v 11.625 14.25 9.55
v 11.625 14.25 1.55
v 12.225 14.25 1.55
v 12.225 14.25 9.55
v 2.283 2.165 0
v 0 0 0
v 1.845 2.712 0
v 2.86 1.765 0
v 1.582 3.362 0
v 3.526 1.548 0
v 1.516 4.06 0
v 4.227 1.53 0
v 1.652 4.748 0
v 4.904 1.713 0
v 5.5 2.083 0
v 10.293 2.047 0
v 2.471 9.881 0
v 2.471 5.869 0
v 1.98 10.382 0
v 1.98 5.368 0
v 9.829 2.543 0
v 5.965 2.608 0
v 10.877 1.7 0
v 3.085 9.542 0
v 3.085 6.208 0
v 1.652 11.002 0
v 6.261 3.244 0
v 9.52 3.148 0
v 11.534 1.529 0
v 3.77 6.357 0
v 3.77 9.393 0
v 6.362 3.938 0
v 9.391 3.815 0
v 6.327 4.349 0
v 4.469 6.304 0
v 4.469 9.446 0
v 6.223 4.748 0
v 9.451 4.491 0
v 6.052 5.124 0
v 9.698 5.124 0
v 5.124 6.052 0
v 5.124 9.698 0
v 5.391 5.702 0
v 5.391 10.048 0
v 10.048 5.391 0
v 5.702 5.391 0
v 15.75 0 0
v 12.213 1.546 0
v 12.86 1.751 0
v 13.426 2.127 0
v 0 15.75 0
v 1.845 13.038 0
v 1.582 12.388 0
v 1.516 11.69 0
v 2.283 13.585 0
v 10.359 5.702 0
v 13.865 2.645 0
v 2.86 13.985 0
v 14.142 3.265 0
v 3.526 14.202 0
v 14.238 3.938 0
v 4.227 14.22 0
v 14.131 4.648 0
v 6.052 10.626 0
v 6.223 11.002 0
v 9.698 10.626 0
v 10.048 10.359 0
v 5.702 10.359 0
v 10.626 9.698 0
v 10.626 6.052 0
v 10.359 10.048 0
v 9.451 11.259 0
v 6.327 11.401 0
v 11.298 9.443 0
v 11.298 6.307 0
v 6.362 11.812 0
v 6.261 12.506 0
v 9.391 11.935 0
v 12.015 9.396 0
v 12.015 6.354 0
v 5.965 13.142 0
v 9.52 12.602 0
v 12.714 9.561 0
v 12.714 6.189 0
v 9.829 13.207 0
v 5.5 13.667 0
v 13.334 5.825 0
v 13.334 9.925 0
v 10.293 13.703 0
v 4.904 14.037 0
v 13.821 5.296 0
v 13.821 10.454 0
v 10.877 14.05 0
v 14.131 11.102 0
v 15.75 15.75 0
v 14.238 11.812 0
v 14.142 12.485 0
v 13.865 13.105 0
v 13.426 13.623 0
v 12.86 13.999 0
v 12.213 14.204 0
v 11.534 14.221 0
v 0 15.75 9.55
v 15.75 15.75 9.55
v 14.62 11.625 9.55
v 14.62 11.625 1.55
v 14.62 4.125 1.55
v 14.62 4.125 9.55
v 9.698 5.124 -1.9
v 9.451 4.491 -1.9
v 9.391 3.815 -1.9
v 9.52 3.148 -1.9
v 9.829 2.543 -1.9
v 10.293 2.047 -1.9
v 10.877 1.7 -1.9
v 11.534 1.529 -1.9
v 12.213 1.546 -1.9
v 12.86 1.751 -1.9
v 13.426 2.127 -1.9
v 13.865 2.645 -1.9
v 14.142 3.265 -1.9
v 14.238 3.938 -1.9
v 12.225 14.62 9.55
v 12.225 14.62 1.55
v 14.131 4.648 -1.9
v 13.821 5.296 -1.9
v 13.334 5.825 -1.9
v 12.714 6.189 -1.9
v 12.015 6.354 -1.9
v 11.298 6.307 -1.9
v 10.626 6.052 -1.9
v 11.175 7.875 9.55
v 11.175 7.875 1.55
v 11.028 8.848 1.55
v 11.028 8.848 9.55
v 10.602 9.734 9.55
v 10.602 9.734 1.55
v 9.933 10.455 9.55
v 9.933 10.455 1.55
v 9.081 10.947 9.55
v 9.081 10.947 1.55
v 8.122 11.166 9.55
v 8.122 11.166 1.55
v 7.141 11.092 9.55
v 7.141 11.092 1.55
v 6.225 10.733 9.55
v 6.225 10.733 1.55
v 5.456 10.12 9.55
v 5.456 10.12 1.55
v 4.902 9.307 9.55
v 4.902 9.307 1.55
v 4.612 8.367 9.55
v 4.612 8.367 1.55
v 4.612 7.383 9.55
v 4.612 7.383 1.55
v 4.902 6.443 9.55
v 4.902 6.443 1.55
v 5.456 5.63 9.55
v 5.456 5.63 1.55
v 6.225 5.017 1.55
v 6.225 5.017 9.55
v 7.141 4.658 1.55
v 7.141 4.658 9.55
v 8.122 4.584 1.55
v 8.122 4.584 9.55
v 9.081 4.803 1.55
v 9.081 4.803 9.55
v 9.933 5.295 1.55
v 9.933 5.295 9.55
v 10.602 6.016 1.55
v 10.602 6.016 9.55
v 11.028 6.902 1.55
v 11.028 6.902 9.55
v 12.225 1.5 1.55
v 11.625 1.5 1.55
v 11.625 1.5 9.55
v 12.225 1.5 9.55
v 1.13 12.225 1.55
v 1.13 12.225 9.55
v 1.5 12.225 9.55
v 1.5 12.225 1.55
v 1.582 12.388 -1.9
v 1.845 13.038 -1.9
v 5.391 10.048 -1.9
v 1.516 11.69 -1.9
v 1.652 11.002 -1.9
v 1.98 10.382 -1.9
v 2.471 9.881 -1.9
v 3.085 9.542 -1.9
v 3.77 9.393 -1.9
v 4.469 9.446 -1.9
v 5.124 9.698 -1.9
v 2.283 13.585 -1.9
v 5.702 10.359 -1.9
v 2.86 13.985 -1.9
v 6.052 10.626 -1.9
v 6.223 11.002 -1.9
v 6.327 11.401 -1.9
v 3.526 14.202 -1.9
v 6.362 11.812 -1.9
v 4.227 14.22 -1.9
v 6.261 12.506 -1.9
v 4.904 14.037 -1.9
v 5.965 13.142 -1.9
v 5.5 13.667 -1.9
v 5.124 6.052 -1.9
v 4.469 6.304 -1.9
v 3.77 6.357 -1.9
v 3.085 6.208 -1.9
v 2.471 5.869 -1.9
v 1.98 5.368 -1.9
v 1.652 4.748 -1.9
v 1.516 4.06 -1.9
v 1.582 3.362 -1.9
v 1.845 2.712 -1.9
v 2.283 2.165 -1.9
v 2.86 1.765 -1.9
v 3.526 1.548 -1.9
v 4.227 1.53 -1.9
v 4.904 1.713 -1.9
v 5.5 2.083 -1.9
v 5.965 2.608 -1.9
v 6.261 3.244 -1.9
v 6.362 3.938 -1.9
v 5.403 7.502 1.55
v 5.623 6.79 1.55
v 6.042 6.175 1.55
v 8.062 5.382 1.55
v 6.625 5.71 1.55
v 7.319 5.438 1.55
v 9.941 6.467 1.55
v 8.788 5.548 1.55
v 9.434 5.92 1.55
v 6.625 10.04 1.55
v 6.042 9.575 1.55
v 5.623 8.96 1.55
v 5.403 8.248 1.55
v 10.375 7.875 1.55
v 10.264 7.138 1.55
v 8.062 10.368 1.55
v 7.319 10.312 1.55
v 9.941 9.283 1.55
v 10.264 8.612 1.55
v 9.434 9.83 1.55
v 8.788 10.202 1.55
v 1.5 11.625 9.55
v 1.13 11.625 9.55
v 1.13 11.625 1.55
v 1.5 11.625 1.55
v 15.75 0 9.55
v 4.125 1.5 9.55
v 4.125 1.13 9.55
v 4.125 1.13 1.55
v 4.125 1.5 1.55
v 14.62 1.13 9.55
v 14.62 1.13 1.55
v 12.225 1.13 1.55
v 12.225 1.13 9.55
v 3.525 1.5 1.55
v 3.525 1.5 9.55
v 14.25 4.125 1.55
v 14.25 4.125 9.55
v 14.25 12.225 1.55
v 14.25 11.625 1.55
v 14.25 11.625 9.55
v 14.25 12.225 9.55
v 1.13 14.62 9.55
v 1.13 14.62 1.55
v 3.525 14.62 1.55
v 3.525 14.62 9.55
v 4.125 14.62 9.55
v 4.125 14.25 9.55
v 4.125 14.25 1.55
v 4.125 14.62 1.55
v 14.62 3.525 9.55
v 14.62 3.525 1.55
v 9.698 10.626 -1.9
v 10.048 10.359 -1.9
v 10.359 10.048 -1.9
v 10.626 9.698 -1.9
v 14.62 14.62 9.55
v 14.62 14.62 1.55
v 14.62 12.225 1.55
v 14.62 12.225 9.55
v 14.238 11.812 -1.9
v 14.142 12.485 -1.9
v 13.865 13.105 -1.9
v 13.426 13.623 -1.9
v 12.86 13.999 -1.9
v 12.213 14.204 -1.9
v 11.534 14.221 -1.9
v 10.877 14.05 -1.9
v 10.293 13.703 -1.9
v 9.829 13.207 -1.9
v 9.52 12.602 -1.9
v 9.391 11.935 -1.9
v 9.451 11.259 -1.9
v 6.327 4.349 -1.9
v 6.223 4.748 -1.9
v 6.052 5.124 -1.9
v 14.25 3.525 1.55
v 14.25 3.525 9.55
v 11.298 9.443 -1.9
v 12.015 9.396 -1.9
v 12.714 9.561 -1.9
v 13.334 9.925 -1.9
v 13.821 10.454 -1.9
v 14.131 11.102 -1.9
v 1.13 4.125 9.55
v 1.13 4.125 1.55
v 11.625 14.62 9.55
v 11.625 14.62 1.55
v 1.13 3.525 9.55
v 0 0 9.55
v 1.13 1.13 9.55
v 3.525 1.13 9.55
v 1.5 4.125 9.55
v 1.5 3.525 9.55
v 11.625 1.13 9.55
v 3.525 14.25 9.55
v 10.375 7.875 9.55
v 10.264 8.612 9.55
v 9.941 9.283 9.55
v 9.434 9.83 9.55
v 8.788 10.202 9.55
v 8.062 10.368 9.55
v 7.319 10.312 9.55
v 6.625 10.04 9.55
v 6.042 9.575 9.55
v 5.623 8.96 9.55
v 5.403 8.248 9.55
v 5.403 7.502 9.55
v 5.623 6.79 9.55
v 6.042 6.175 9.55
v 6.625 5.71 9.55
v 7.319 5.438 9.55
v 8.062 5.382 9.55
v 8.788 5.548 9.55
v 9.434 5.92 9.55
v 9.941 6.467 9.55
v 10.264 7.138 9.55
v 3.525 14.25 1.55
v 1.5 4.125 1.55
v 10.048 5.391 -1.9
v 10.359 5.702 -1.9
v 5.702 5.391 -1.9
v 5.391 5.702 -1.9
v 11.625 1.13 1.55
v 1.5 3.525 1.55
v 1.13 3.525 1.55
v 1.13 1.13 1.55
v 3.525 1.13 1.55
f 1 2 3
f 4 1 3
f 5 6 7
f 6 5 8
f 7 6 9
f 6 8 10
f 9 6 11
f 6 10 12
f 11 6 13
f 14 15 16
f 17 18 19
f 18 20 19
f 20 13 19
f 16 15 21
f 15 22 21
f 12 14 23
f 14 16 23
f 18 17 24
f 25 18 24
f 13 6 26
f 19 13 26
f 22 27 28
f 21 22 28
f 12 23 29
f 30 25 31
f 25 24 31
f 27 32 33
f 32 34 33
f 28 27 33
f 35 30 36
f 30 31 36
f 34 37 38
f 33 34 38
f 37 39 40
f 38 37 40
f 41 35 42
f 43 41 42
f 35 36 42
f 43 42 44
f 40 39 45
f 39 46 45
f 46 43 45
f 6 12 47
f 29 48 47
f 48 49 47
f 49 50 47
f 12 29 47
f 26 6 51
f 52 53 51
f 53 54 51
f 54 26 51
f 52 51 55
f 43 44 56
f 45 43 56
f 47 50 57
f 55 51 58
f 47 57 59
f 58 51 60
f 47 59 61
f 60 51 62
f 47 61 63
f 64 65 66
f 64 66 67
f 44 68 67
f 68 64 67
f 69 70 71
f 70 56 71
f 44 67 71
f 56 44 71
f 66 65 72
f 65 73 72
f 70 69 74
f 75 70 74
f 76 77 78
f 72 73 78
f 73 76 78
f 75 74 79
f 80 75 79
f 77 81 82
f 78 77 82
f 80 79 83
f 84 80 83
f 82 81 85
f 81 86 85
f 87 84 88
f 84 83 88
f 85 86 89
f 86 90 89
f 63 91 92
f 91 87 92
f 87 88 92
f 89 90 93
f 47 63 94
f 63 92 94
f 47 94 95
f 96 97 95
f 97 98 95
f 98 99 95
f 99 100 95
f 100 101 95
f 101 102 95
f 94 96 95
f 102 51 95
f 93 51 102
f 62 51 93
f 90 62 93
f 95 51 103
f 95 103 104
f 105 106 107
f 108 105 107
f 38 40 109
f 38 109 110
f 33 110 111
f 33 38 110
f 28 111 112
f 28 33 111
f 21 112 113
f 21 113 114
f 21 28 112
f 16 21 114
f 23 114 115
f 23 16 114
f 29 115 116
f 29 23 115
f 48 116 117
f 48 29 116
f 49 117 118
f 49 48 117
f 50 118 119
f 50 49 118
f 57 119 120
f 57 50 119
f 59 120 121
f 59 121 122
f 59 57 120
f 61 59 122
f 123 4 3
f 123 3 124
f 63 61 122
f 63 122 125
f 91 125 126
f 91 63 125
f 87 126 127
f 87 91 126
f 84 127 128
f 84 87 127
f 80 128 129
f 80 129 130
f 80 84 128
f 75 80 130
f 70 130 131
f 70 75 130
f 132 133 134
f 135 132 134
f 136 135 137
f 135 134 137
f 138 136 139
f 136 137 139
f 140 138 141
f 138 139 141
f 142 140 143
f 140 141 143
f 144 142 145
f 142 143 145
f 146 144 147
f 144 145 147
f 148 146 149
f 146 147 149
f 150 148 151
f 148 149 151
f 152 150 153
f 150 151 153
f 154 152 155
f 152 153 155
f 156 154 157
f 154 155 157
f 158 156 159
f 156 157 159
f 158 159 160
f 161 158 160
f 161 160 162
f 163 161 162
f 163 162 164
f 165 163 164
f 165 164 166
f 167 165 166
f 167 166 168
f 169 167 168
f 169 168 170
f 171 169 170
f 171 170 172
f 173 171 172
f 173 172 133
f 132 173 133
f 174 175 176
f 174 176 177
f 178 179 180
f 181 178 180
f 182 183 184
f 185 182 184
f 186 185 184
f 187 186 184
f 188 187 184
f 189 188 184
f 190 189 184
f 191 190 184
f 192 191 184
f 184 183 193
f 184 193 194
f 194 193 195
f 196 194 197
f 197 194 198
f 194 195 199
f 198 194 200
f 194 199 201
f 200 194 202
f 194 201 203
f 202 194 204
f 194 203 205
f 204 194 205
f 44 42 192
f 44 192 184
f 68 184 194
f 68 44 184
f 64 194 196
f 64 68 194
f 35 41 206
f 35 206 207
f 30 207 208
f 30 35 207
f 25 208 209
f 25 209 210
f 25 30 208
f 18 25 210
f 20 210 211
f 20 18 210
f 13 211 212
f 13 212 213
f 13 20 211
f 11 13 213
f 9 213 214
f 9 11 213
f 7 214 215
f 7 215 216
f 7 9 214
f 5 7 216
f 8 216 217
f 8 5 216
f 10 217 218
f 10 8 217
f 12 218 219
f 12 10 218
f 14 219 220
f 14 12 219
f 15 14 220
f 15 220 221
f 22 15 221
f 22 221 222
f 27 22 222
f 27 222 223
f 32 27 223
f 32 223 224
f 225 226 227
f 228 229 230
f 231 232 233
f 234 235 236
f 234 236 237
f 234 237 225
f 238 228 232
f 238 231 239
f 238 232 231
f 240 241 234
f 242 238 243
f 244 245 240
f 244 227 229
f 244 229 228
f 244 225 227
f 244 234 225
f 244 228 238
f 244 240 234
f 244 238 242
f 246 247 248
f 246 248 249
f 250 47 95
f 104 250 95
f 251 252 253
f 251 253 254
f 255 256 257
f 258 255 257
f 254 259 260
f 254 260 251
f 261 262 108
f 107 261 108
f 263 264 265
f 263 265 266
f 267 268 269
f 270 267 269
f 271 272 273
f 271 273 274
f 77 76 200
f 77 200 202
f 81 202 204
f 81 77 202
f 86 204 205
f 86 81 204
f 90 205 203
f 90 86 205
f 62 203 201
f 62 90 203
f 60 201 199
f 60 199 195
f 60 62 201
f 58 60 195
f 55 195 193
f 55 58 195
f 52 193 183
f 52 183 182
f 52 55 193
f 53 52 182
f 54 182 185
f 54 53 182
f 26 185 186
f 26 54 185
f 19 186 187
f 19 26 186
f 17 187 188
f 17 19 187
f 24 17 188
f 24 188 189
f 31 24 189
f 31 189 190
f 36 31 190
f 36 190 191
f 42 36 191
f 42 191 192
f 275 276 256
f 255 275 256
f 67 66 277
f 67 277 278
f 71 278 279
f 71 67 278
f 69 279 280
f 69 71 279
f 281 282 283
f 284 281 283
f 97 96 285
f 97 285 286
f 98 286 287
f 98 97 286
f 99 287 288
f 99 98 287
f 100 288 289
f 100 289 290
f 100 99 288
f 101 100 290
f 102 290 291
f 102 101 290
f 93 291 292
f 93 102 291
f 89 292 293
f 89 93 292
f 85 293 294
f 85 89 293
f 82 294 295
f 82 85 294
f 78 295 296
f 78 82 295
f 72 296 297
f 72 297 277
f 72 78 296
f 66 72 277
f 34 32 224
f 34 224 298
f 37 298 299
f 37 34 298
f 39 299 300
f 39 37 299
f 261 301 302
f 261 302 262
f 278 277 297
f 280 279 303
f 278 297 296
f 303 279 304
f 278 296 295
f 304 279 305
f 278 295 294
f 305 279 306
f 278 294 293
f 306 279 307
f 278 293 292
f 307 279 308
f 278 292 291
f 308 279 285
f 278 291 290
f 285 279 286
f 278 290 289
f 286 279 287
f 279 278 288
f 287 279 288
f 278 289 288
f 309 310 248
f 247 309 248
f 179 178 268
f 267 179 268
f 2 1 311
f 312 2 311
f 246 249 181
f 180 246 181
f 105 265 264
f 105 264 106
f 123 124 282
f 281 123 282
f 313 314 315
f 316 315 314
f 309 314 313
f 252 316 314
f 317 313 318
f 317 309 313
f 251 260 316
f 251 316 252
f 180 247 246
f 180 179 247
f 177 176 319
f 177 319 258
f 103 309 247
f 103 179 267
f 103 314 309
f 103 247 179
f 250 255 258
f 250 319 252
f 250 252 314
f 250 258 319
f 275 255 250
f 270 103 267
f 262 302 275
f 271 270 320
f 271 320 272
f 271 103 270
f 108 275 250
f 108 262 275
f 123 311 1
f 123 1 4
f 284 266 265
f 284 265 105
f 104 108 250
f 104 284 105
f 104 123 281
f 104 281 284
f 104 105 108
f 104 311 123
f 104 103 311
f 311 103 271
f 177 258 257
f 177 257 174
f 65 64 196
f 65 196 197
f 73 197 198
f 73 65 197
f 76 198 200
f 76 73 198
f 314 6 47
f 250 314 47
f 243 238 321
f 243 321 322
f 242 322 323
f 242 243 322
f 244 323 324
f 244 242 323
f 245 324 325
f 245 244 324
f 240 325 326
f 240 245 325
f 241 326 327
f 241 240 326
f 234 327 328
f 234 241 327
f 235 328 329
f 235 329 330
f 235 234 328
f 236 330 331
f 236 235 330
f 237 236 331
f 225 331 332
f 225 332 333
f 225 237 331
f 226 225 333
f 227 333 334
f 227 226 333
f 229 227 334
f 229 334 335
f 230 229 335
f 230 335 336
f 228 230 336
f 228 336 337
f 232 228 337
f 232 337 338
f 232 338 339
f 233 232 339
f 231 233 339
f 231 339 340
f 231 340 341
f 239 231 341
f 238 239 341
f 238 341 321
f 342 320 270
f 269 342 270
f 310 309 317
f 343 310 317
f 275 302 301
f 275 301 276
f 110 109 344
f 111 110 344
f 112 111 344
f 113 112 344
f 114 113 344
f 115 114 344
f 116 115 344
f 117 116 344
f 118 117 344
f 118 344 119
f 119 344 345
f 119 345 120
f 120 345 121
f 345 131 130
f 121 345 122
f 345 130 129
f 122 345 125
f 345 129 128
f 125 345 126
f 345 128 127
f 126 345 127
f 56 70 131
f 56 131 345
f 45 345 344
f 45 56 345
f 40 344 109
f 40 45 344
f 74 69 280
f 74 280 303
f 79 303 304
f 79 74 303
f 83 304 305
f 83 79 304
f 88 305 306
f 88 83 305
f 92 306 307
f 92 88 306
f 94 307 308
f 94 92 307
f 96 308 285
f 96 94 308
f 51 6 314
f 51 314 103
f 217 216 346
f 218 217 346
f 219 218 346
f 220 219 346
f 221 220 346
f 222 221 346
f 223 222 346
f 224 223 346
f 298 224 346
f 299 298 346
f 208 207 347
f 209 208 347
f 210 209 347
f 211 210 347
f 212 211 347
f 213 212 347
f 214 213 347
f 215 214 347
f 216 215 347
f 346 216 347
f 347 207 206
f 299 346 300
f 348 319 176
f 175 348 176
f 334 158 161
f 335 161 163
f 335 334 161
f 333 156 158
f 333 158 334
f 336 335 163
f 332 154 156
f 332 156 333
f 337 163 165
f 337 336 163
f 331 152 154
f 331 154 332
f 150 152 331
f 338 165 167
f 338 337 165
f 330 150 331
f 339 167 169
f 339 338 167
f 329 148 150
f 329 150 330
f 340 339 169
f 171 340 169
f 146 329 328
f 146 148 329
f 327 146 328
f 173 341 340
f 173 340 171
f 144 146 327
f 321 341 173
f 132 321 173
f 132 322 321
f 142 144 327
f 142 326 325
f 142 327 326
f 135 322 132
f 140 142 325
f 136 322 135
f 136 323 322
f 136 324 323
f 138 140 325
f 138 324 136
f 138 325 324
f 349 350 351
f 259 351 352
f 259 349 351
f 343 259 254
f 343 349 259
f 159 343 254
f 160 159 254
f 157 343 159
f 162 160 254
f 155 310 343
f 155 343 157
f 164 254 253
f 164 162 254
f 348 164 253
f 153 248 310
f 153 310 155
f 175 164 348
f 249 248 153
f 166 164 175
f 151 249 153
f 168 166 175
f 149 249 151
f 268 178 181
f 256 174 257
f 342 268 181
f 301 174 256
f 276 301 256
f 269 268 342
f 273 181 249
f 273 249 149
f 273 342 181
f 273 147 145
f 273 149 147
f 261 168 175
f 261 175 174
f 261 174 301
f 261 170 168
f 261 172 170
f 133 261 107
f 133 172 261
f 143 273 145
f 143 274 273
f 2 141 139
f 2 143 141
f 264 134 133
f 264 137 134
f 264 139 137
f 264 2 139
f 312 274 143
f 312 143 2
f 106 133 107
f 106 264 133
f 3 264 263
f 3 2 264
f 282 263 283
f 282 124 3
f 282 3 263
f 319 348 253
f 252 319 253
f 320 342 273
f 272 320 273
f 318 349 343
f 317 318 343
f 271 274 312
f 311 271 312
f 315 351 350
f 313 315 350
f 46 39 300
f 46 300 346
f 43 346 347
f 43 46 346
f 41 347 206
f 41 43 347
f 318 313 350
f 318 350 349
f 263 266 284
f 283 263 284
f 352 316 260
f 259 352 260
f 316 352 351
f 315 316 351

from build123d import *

# Parameters (mm, degrees)
F0_W     = 15.75
F0_H     = 15.75
F0_W_2   = 0.6
F0_H_2   = 0.37
F0_W_3   = 0.37
F0_H_3   = 0.6
F1_DEPTH = 9.55
F0_R     = 3.3
F0_R_2   = 2.5
F2_DEPTH = 1.55
F4_DEPTH = 1.9


with BuildPart() as f1:
    # F0 (on Top) → F1 (new body)
    with BuildSketch(Plane.XY):
        with Locations((7.875, 7.875)):
            Rectangle(F0_W, F0_H)
        Polygon((1.13, 12.225), (1.13, 14.62), (3.525, 14.62), (4.125, 14.62), (11.625, 14.62), (12.225, 14.62), (14.62, 14.62), (14.62, 12.225), (14.62, 11.625), (14.62, 4.125), (14.62, 3.525), (14.62, 1.13), (12.225, 1.13), (11.625, 1.13), (4.125, 1.13), (3.525, 1.13), (1.13, 1.13), (1.13, 3.525), (1.13, 4.125), (1.13, 11.625), align=None, mode=Mode.SUBTRACT)
        with Locations((3.825, 14.435)):
            Rectangle(F0_W_2, F0_H_2)
        with Locations((1.315, 11.925)):
            Rectangle(F0_W_3, F0_H_3)
        with Locations((1.315, 3.825)):
            Rectangle(F0_W_3, F0_H_3)
        with Locations((3.825, 1.315)):
            Rectangle(F0_W_2, F0_H_2)
        with Locations((11.925, 1.315)):
            Rectangle(F0_W_2, F0_H_2)
        with Locations((14.435, 3.825)):
            Rectangle(F0_W_3, F0_H_3)
        with Locations((14.435, 11.925)):
            Rectangle(F0_W_3, F0_H_3)
        with Locations((11.925, 14.435)):
            Rectangle(F0_W_2, F0_H_2)
    extrude(amount=F1_DEPTH)



with BuildPart() as f1b:
    # F0 (on Top) → F1, piece 2 (new body)
    with BuildSketch(Plane.XY):
        with Locations((7.875, 7.875)):
            Circle(F0_R)
        with Locations((7.875, 7.875)):
            Circle(F0_R_2, mode=Mode.SUBTRACT)
    extrude(amount=F1_DEPTH)


with BuildPart() as f1_1:
    add(f1.part)

    add(f1b.part)  # F2 merges F1b
    # F0 (on Top) → F2 (join)
    with BuildSketch(Plane.XY):
        Polygon((3.525, 14.62), (1.13, 14.62), (1.13, 12.225), (1.5, 12.225), (1.5, 11.625), (1.13, 11.625), (1.13, 4.125), (1.5, 4.125), (1.5, 3.525), (1.13, 3.525), (1.13, 1.13), (3.525, 1.13), (3.525, 1.5), (4.125, 1.5), (4.125, 1.13), (11.625, 1.13), (11.625, 1.5), (12.225, 1.5), (12.225, 1.13), (14.62, 1.13), (14.62, 3.525), (14.25, 3.525), (14.25, 4.125), (14.62, 4.125), (14.62, 11.625), (14.25, 11.625), (14.25, 12.225), (14.62, 12.225), (14.62, 14.62), (12.225, 14.62), (12.225, 14.25), (11.625, 14.25), (11.625, 14.62), (4.125, 14.62), (4.125, 14.25), (3.525, 14.25), align=None)
        with Locations((7.875, 7.875)):
            Circle(F0_R, mode=Mode.SUBTRACT)
        with Locations((7.875, 7.875)):
            Circle(F0_R_2)
    extrude(amount=F2_DEPTH)

    # F3 (on face) → F4 (join)
    with BuildSketch(Plane.XY):
        with BuildLine():
            ThreePointArc((5.1239527498, 6.0524361391), (1.8449210985, 2.7120455778), (6.3625, 3.9375))
            ThreePointArc((6.3625, 3.9375), (6.2837038634, 4.5506495995), (6.0524361391, 5.1239527498))
            ThreePointArc((6.0524361391, 5.1239527498), (5.5415476221, 5.5415476221), (5.1239527498, 6.0524361391))
        make_face()
        with BuildLine():
            ThreePointArc((10.6260472502, 6.0524361391), (10.2084523779, 5.5415476221), (9.6975638609, 5.1239527498))
            ThreePointArc((9.6975638609, 5.1239527498), (11.1993504005, 1.5912961366), (14.2375, 3.9375))
            ThreePointArc((14.2375, 3.9375), (13.0379544222, 6.0300789015), (10.6260472502, 6.0524361391))
        make_face()
        with BuildLine():
            ThreePointArc((6.3625, 11.8125), (1.8449210985, 13.0379544222), (5.1239527498, 9.6975638609))
            ThreePointArc((5.1239527498, 9.6975638609), (5.5415476221, 10.2084523779), (6.0524361391, 10.6260472502))
            ThreePointArc((6.0524361391, 10.6260472502), (6.2837038634, 11.1993504005), (6.3625, 11.8125))
        make_face()
        with BuildLine():
            ThreePointArc((14.2375, 11.8125), (11.1993504005, 14.1587038634), (9.6975638609, 10.6260472502))
            ThreePointArc((9.6975638609, 10.6260472502), (10.2084523779, 10.2084523779), (10.6260472502, 9.6975638609))
            ThreePointArc((10.6260472502, 9.6975638609), (13.0379544222, 9.7199210985), (14.2375, 11.8125))
        make_face()
    extrude(amount=-F4_DEPTH)


solid = f1_1.part
